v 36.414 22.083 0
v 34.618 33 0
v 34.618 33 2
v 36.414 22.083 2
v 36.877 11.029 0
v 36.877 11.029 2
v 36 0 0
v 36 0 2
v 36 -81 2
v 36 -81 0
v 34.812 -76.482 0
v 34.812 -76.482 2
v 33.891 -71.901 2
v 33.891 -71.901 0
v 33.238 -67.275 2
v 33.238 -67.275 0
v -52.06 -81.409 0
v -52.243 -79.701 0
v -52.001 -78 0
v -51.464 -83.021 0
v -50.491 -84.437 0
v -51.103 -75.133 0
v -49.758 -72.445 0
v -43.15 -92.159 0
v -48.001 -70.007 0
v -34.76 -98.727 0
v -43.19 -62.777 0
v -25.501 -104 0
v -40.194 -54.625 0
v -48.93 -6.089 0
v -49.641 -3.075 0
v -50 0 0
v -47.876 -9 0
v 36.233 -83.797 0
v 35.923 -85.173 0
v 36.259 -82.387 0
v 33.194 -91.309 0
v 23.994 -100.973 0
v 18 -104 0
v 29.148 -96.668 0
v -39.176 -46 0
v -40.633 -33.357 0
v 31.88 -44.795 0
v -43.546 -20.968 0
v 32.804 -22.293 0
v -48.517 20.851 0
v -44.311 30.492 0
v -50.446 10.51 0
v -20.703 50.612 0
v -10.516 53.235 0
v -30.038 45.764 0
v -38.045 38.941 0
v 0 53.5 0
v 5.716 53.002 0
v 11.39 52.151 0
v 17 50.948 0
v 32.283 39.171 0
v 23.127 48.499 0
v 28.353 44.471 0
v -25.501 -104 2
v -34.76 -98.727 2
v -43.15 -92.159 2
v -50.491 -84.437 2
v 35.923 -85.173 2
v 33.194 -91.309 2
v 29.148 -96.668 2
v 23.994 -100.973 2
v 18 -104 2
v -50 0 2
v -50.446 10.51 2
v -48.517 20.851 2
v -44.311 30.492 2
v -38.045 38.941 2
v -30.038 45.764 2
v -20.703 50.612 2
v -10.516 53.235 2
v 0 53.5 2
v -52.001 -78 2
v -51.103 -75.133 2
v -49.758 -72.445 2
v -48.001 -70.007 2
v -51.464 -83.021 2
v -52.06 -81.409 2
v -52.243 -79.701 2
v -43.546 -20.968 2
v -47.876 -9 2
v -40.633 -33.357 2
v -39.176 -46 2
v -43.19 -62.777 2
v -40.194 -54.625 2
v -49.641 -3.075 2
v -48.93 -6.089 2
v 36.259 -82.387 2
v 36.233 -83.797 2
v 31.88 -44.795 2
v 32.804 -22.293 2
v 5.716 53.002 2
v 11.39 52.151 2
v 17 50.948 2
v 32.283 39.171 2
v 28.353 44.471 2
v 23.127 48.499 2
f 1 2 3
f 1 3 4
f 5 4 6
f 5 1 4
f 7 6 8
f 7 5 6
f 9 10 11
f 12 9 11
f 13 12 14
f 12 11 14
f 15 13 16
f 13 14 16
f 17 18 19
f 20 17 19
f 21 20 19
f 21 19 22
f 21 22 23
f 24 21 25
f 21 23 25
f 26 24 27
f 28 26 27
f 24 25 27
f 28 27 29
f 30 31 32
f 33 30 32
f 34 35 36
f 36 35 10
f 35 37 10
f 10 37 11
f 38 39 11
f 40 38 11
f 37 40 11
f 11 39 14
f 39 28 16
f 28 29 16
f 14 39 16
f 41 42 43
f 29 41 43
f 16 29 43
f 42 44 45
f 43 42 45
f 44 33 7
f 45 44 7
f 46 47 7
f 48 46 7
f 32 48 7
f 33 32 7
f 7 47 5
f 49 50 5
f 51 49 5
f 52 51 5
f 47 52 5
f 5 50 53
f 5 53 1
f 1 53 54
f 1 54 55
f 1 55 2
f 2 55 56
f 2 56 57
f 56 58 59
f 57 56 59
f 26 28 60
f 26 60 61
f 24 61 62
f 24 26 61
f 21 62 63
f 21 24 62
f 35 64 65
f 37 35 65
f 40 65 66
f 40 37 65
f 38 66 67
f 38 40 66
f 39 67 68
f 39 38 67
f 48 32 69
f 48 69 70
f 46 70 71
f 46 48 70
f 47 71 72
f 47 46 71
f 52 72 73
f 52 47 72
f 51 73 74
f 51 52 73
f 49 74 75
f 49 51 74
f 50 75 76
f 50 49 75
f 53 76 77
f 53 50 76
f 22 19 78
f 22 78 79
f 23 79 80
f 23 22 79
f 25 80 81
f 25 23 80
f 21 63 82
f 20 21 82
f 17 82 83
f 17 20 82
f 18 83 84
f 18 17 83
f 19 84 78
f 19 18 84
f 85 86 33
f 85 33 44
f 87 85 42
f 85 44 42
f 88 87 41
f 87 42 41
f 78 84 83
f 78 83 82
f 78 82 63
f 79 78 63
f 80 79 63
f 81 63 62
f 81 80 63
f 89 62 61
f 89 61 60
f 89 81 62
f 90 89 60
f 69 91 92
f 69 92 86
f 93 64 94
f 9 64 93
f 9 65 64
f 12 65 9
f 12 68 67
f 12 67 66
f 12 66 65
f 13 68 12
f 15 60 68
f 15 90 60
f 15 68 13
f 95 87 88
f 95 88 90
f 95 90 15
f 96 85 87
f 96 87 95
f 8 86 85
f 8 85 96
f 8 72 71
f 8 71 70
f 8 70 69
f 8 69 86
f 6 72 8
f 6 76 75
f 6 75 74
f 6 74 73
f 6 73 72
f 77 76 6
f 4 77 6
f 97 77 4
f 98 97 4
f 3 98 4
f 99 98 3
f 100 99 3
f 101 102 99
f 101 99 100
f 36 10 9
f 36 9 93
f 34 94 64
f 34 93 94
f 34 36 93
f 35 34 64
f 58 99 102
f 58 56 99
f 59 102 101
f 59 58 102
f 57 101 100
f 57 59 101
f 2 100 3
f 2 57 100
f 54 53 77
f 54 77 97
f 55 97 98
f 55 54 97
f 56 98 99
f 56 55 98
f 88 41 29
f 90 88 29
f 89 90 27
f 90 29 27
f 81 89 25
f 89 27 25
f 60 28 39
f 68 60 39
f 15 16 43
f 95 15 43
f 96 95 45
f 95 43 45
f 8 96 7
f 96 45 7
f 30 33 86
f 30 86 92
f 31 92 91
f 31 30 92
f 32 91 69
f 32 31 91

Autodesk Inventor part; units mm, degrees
ref_plane "YZ Plane" through (0, 0, 0) normal (1, 0, 0) x (0, 1, 0)
ref_plane "XZ Plane" through (0, 0, 0) normal (0, 1, 0) x (-1, 0, 0)
ref_plane "XY Plane" through (0, 0, 0) normal (0, 0, 1) x (1, 0, 0)
sketch "Sketch1" plane through (0, 0, 0) normal (0, 0, 1) x (1, 0, 0)
  arc A0 (17, 50.9482) -> (0, 53.5) centre (-5.1444, -38.6736) ccw
  arc A1 (34.618, 33) -> (17, 50.9482) centre (11.2519, 27.6848) ccw
  arc A2 (36, 0) -> (34.618, 33) centre (-54.4409, 12.7413) ccw
  line L0 (36, 0) -> (36, -81) construction
  arc A3 (-50, 0) -> (-47.876, -9) centre (-23.2557, 1.561) ccw
  line L1 (-50, 0) -> (-52.0013, -78) construction
  arc A4 (-39.1762, -46) -> (-47.876, -9) centre (-148.6013, -52.2064) ccw
  arc A5 (-48.0013, -70.0072) -> (-39.1762, -46) centre (-76.244, -45.9995) ccw
  arc A6 (-48.0013, -70.0072) -> (-52.0013, -78) centre (-33.7069, -82.1582) ccw
  line L2 (36, 0) -> (36, -81) construction
  arc A7 (0, 53.5) -> (-50, 0) centre (-4.0952, 7.2128) ccw
  arc A8 (-52.0013, -78) -> (-50.4909, -84.4368) centre (-45.2921, -79.8213) ccw
  arc A9 (-50.4909, -84.4368) -> (-25.5013, -104) centre (5.8002, -38.274) ccw
  line L3 (-25.5013, -104) -> (18, -104)
  arc A10 (36, 0) -> (33.2377, -67.2753) centre (254.1506, -42.6516) ccw
  arc A11 (18, -104) -> (35.9231, -85.173) centre (7.7888, -76.3343) ccw
  arc A12 (33.2377, -67.2753) -> (36, -81) centre (112.7493, -58.4127) ccw
  arc A13 (35.9231, -85.173) -> (36, -81) centre (29.326, -82.9642) ccw
  point P0 (0, 0)
  dimension "d6" = 53.5
  dimension "d7" = 50
  dimension "d8" = 36
  dimension "d10" = 81
  dimension "d16" = 78
  dimension "d18" = 9
  dimension "d24" = 4
  dimension "d28" = 33
  dimension "d29" = 46
  dimension "d33" = 104
  dimension "d34" = 26.5
  dimension "d35" = 18
  dimension "d36" = 0
  dimension "d38" = 92.317
  dimension "d39" = 91.334
  dimension "d40" = 46.468
  dimension "d41" = 26.7899
  dimension "d42" = 222.281
  dimension "d43" = 80.004
  dimension "d44" = 109.601
  dimension "d45" = 37.0678
  dimension "d46" = 18.761
  dimension "d47" = 6.952
  dimension "d48" = 72.799
  dimension "d49" = 29.49
  dimension "d50" = 6.957
  dimension "d51" = 17
  dimension "d52" = 0
  dimension "d53" = 23.963
  dimension "d54" = 50
  dimension "d55" = 2.0013
  dimension "d56" = 12.0001
  dimension "d57" = 67.2753
  dimension "d58" = 18.827
  dimension "d59" = 19.5632
  dimension "d61" = 24.9896
extrude "Extrusion1" add sketch "Sketch1" along normal blind 2
properties part number "_3DPrint"
